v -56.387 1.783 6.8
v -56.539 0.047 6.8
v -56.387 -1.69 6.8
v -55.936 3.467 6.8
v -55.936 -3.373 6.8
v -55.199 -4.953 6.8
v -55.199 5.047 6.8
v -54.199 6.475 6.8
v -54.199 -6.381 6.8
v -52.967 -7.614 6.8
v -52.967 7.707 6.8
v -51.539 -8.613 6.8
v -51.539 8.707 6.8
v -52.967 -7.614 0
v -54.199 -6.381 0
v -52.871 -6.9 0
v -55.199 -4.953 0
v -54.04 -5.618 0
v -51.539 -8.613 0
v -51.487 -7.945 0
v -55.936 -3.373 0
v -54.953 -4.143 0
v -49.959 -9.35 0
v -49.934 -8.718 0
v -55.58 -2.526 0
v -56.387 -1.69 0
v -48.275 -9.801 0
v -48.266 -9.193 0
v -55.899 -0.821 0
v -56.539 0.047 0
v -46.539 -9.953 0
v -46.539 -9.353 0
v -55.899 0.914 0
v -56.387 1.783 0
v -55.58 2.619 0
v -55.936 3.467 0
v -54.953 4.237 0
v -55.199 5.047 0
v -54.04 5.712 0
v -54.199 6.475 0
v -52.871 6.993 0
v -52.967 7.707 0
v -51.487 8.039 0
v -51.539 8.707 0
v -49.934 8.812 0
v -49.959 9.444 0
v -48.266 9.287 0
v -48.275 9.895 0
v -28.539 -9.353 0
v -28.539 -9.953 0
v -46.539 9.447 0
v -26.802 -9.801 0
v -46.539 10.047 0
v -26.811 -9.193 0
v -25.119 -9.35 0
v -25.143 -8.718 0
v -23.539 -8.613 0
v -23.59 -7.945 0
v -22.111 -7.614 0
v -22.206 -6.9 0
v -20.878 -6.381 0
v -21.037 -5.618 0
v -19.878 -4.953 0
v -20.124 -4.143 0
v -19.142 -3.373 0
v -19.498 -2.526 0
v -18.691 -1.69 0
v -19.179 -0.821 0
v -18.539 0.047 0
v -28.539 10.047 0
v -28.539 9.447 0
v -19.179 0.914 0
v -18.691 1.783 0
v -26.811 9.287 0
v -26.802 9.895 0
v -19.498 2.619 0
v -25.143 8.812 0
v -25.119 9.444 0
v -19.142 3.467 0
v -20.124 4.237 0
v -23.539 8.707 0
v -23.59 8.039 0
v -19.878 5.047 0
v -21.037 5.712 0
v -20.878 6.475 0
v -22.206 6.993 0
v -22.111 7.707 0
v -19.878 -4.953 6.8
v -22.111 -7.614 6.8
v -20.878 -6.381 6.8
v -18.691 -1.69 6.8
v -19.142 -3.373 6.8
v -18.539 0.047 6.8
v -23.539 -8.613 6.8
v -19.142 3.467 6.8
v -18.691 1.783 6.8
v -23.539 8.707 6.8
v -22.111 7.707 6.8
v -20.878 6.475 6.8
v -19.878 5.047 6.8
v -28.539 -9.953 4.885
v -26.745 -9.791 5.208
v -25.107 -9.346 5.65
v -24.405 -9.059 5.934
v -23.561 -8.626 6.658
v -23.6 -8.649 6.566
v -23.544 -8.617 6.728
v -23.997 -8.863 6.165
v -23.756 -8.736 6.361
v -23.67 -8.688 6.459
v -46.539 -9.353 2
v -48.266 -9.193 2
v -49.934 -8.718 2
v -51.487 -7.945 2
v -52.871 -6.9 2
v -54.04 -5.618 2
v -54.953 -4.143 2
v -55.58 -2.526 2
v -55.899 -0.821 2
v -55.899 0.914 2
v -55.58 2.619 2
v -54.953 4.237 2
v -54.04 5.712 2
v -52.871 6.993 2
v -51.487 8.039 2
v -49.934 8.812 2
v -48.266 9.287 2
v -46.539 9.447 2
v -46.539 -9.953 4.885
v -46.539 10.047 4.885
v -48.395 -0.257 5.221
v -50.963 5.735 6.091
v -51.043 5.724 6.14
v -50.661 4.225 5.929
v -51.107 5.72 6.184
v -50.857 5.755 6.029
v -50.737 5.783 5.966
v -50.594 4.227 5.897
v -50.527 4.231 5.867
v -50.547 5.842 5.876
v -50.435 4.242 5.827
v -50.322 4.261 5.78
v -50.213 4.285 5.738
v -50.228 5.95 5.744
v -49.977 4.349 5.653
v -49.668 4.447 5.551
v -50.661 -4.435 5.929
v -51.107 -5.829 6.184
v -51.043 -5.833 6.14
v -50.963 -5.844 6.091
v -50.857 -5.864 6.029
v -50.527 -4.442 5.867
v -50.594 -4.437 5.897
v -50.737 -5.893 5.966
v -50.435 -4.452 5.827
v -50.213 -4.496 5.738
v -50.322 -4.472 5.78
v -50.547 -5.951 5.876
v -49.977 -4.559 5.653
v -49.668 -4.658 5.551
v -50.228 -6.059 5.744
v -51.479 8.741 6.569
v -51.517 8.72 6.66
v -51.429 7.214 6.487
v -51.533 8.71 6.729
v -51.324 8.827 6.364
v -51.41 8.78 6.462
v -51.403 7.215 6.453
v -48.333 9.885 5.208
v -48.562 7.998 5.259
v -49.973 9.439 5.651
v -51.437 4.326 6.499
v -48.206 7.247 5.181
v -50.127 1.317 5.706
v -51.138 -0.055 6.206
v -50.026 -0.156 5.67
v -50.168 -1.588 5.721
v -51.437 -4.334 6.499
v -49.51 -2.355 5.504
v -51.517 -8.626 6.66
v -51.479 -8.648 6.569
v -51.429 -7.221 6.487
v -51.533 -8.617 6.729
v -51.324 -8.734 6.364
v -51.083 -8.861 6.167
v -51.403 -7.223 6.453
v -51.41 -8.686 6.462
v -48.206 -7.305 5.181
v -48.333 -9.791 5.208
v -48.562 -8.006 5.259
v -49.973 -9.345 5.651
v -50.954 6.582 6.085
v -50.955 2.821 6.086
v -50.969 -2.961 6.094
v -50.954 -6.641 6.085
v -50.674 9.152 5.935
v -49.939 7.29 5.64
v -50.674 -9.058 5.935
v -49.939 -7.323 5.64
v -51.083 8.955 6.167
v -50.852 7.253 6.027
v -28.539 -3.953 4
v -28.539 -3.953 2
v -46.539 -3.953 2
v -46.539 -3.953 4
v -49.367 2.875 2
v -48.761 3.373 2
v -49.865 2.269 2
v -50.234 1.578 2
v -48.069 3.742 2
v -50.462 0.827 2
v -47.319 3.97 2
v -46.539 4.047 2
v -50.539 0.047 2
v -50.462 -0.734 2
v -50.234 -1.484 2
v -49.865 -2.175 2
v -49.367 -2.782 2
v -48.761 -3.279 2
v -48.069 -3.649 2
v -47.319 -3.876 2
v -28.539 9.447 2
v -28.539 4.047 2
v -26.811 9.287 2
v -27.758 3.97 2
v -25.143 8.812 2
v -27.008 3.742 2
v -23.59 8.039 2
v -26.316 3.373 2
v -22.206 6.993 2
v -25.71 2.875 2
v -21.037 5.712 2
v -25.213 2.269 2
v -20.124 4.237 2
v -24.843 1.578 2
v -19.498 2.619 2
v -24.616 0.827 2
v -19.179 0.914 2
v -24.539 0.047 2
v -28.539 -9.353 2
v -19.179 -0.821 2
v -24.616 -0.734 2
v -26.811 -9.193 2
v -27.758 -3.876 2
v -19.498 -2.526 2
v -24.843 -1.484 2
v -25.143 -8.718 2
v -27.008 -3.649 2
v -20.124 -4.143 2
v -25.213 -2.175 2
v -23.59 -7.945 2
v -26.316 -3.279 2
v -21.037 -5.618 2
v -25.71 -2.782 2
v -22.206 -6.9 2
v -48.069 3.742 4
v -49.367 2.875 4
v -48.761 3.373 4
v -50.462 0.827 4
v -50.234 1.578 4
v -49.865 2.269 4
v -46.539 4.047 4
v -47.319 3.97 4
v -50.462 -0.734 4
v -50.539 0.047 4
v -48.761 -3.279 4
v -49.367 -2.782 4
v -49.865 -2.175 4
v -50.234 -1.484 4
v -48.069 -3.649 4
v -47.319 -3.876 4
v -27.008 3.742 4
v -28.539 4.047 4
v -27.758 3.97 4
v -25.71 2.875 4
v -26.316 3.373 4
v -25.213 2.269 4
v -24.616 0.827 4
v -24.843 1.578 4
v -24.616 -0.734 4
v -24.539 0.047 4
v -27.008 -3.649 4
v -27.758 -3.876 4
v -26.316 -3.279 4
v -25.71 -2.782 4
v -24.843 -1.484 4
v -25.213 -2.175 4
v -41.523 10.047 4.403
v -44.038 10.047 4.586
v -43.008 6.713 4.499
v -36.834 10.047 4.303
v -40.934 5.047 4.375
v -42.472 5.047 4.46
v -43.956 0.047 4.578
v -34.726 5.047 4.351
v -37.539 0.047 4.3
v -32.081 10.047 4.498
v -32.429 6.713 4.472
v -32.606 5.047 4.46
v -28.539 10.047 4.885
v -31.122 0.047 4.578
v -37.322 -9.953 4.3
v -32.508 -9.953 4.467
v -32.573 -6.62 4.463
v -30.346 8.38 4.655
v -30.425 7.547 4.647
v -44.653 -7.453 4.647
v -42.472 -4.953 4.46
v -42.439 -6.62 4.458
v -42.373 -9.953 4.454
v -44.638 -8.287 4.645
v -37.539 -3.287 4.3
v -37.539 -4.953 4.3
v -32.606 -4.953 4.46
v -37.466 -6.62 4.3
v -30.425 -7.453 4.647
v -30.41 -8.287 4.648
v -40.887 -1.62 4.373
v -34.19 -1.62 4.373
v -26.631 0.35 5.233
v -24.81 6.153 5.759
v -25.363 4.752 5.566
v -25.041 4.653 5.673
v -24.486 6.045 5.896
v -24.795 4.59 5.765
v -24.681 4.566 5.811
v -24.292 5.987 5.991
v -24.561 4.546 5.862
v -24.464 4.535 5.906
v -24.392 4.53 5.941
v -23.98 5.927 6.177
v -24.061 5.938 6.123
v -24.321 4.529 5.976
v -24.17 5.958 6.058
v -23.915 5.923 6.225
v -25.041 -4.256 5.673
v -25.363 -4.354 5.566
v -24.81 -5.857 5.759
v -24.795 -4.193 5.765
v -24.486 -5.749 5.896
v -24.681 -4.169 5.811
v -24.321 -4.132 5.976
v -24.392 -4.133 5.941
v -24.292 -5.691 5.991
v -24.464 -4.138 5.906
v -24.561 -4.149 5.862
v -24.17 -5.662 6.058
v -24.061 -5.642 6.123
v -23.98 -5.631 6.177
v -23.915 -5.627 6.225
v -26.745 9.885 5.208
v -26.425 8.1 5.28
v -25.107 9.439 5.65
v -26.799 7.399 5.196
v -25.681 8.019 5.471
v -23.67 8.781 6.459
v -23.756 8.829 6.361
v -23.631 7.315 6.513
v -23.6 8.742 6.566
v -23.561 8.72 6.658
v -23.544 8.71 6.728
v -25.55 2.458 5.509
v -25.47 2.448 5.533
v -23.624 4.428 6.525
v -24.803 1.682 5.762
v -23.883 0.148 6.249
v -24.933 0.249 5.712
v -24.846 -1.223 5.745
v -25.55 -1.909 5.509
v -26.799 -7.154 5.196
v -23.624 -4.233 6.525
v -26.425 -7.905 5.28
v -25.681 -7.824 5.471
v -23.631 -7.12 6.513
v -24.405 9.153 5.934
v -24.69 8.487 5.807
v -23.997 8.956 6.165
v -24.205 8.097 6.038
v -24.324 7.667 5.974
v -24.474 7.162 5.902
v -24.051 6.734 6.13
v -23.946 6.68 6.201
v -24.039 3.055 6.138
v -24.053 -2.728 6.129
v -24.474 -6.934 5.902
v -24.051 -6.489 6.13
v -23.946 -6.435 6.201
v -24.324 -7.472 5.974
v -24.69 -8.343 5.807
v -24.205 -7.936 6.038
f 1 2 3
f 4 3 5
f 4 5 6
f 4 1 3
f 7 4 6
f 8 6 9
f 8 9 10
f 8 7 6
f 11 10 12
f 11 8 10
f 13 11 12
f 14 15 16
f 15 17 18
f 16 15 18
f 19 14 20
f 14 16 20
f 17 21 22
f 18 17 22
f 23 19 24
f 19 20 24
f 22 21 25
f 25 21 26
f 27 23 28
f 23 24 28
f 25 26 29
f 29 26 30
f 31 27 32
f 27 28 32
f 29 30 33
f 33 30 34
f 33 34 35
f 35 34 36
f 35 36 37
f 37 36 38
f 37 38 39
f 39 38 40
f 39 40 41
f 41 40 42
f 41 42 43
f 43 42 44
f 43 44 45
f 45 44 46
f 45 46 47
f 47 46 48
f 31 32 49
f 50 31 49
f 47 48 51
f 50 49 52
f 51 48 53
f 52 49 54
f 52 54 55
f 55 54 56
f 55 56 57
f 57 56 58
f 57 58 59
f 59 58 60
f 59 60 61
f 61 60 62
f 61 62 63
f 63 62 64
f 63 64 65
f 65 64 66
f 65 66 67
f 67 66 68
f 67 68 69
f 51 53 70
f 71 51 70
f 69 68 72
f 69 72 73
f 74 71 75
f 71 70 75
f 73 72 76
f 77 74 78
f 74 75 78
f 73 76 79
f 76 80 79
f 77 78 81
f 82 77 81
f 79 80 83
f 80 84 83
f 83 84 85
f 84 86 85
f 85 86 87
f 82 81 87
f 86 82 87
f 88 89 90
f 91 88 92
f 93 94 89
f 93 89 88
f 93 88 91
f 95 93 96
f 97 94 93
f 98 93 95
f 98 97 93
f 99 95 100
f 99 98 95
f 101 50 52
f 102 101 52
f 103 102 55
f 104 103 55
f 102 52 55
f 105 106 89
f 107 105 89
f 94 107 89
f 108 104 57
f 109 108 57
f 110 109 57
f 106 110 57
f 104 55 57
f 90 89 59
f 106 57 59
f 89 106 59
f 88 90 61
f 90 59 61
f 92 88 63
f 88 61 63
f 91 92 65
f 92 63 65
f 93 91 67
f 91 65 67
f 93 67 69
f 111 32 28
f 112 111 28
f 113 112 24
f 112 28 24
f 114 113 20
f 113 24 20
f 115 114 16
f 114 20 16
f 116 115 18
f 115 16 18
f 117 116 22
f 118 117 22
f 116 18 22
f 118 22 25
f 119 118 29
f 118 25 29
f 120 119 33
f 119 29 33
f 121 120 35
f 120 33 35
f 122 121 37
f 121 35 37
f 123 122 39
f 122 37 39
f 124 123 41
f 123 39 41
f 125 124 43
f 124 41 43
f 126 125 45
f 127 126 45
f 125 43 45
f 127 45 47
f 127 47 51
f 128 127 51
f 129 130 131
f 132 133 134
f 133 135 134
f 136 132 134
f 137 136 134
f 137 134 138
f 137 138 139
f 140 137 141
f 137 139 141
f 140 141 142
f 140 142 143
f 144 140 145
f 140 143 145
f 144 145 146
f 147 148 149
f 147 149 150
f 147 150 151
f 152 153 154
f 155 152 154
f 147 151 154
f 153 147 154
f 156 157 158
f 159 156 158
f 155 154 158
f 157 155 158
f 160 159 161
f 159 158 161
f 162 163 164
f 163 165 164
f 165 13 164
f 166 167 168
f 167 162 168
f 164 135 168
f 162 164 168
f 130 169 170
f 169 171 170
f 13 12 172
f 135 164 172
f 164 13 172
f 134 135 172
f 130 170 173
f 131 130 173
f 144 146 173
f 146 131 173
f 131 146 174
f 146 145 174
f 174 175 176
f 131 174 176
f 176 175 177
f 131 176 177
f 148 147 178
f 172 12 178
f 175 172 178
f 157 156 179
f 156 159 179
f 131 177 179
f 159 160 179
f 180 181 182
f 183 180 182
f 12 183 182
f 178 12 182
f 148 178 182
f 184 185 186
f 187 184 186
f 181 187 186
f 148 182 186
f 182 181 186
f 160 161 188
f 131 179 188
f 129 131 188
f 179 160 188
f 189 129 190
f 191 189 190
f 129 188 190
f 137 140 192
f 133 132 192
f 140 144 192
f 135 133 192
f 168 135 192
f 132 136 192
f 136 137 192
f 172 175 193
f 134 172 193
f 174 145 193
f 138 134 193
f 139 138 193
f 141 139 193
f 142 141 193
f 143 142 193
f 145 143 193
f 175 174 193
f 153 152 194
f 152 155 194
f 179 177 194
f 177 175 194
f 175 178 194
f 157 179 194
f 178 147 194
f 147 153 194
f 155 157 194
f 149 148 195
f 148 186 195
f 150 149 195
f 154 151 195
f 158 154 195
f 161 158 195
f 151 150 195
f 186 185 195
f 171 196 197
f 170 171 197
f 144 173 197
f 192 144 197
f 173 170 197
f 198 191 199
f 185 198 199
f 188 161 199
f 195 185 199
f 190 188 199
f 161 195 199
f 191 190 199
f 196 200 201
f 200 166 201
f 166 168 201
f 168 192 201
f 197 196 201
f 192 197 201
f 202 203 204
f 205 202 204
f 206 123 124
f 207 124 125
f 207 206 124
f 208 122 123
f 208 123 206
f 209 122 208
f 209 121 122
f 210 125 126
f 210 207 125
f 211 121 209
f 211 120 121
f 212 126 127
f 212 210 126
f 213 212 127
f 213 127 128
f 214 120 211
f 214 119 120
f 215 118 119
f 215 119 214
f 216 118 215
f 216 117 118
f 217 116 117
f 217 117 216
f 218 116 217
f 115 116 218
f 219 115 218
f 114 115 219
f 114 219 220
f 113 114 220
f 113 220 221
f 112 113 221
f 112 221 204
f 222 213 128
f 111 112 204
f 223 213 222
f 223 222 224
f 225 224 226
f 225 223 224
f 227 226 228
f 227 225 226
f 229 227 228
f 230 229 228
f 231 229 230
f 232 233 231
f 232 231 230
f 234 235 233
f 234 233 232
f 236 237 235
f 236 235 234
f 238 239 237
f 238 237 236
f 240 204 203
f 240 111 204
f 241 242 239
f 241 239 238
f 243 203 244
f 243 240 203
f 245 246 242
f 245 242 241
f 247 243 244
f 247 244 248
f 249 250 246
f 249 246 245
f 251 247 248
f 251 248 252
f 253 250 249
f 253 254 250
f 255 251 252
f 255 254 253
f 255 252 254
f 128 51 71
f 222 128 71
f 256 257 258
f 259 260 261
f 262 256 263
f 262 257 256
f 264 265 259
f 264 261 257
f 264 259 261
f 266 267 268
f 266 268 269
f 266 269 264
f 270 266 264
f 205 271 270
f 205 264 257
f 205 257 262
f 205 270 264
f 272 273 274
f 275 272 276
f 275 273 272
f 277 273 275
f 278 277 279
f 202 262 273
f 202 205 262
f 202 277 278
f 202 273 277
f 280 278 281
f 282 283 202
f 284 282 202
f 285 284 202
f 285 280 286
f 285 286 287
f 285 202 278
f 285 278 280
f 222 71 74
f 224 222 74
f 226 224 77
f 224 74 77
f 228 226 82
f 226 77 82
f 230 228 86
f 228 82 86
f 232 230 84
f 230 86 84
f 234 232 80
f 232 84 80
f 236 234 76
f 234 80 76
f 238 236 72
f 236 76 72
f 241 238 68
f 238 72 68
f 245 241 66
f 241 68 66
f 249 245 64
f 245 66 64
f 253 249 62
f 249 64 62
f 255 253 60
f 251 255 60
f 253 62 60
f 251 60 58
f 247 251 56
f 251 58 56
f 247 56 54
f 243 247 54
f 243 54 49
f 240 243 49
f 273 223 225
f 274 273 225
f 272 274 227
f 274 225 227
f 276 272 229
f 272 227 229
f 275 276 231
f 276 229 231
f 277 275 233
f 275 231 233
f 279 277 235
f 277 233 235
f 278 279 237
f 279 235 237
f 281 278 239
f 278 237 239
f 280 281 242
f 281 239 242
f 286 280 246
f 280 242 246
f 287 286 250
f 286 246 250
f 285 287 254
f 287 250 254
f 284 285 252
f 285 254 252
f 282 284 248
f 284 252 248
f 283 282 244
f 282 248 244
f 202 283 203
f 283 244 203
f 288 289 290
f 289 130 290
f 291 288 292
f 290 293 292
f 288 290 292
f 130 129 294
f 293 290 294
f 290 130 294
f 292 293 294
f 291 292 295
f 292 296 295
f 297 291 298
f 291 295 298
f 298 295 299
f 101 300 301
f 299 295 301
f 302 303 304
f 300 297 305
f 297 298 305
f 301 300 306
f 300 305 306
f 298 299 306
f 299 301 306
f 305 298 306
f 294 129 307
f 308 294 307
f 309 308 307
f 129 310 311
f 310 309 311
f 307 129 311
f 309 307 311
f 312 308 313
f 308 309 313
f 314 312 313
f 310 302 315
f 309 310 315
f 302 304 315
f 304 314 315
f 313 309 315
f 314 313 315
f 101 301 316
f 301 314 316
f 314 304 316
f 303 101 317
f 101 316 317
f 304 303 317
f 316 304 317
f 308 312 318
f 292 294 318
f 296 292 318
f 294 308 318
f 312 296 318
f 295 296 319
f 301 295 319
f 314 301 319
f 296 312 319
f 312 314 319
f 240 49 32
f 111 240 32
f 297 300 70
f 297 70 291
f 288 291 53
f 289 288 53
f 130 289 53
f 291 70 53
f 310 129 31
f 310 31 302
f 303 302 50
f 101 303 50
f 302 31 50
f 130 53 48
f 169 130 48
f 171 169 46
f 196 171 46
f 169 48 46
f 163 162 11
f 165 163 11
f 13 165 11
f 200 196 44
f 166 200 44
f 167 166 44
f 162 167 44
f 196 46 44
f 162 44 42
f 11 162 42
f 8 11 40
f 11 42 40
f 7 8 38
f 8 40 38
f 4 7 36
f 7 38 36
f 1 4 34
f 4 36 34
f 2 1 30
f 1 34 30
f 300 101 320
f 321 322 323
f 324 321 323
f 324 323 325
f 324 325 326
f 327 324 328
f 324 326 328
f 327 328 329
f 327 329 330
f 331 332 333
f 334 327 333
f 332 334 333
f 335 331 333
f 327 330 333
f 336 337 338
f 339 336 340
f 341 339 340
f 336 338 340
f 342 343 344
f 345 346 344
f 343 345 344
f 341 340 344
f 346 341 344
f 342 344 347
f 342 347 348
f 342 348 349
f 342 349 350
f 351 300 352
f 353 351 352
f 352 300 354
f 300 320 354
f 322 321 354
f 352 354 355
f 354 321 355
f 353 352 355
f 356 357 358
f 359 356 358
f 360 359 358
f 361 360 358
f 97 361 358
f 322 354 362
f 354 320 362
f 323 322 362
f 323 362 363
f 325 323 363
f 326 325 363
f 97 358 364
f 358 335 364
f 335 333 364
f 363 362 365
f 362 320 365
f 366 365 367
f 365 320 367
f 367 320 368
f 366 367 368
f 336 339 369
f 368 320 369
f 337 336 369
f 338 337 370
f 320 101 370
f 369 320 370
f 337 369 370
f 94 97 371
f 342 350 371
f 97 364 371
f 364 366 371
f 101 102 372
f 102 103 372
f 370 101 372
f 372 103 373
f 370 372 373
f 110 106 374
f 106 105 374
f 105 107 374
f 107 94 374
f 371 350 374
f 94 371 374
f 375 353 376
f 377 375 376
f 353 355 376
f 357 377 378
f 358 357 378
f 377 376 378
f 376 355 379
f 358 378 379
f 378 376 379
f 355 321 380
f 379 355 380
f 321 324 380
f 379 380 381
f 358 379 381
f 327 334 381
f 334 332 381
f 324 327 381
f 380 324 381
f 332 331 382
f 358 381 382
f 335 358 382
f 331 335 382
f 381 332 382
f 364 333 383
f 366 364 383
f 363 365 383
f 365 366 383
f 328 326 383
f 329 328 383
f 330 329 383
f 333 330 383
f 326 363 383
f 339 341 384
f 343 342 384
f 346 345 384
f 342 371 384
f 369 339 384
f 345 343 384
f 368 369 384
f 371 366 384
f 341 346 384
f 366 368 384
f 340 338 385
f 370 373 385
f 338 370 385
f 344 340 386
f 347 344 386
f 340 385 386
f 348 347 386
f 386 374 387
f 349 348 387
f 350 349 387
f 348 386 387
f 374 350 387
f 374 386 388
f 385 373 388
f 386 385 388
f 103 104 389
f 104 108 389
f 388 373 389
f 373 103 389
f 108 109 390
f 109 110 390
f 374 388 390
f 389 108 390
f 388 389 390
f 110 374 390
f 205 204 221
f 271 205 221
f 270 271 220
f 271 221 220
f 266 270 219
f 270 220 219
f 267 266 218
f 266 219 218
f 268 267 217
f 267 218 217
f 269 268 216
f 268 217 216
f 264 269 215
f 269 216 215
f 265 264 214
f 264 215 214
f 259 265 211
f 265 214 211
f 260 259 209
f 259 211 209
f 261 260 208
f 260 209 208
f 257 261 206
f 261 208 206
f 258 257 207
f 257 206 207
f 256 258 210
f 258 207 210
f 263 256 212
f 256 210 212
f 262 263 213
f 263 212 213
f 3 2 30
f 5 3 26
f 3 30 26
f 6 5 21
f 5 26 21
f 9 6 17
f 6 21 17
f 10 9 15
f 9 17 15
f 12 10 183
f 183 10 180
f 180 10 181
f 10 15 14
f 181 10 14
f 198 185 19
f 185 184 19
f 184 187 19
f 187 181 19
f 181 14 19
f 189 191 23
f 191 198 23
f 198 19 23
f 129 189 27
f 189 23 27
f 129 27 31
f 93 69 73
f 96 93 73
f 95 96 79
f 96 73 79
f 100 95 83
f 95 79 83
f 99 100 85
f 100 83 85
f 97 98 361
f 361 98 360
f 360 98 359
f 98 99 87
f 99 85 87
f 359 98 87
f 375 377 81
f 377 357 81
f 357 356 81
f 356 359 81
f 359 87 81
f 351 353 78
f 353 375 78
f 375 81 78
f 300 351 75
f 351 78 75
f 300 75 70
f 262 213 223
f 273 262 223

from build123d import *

# Parameters (mm, degrees)
F1_DEPTH = 6.8
F3_DEPTH = 25
F5_DEPTH = 2
F7_DEPTH = 2


with BuildPart() as f1:
    # F0 (on Top) → F1 (new body)
    with BuildSketch(Plane.XY):
        with BuildLine():
            ThreePointArc((-46.538709, 10.046789), (-53.609776, 7.117857), (-56.538709, 0.046789))
            Line((-56.538709, 0.046789), (-37.538709, 0.046789))
            Line((-37.538709, 0.046789), (-37.538709, 10.046789))
            Line((-37.538709, 10.046789), (-46.538709, 10.046789))
        make_face()
        with BuildLine():
            Line((-37.538709, 0.046789), (-56.538709, 0.046789))
            ThreePointArc((-56.538709, 0.046789), (-53.609776, -7.024279), (-46.538709, -9.953211))
            Line((-46.538709, -9.953211), (-37.538709, -9.953211))
            Line((-37.538709, -9.953211), (-37.538709, 0.046789))
        make_face()
        with BuildLine():
            Line((-37.538709, 10.046789), (-37.538709, 0.046789))
            Line((-37.538709, 0.046789), (-18.538709, 0.046789))
            ThreePointArc((-18.538709, 0.046789), (-21.467641, 7.117857), (-28.538709, 10.046789))
            Line((-28.538709, 10.046789), (-37.538709, 10.046789))
        make_face()
        with BuildLine():
            Line((-18.538709, 0.046789), (-37.538709, 0.046789))
            Line((-37.538709, 0.046789), (-37.538709, -9.953211))
            Line((-37.538709, -9.953211), (-28.538709, -9.953211))
            ThreePointArc((-28.538709, -9.953211), (-21.467641, -7.024279), (-18.538709, 0.046789))
        make_face()
    extrude(amount=F1_DEPTH)

    # F2 (on face) → F3 (cut)
    with BuildSketch(Plane.XZ.offset(9.953211)):
        with BuildLine():
            Line((-46.538709, 6.8), (-46.538709, 4.885035))
            add(Edge.make_bspline(
                [(-46.538709, 4.885035), (-37.538709, 3.536233), (-28.538709, 4.885035)],
                knots=[4.014167, 4.014167, 4.014167, 5.410611, 5.410611, 5.410611], degree=2, weights=[1, 0.765986, 1]))
            Line((-28.538709, 4.885035), (-28.538709, 6.8))
            Line((-28.538709, 6.8), (-46.538709, 6.8))
        make_face()
        with BuildLine():
            add(Edge.make_bspline(
                [(-28.538709, 4.885035), (-23.538709, 5.634369), (-23.538709, 6.8)],
                knots=[5.410611, 5.410611, 5.410611, 6.283185, 6.283185, 6.283185], degree=2, weights=[1, 0.906327, 1]))
            add(Edge.make_bspline(
                [(-23.538709, 6.8), (-23.538709, 10.724017), (-43.454788, 9.065817), (-63.370868, 7.407617), (-46.538709, 4.885035)],
                knots=[0, 0, 0, 2.007083, 2.007083, 4.014167, 4.014167, 4.014167], degree=2, weights=[1, 0.537319, 1, 0.537319, 1]))
            Line((-46.538709, 4.885035), (-46.538709, 6.8))
            Line((-46.538709, 6.8), (-28.538709, 6.8))
            Line((-28.538709, 6.8), (-28.538709, 4.885035))
        make_face()
    extrude(amount=-F3_DEPTH, mode=Mode.SUBTRACT)

    # F4 (on face) → F5 (cut)
    with BuildSketch(Plane(origin=(0, 0, 0), x_dir=(1, 0, 0), z_dir=(0, 0, -1))):
        with BuildLine():
            Line((-28.538709, 9.353211), (-46.538709, 9.353211))
            ThreePointArc((-46.538709, 9.353211), (-55.938709, -0.046789), (-46.538709, -9.446789))
            Line((-46.538709, -9.446789), (-28.538709, -9.446789))
            ThreePointArc((-28.538709, -9.446789), (-19.138709, -0.046789), (-28.538709, 9.353211))
        make_face()
    extrude(amount=-F5_DEPTH, mode=Mode.SUBTRACT)

    # F6 (on face) → F7 (cut)
    with BuildSketch(Plane(origin=(0, 0, 2), x_dir=(1, 0, 0), z_dir=(0, 0, -1))):
        with BuildLine():
            Line((-28.538709, 3.953211), (-46.538709, 3.953211))
            ThreePointArc((-46.538709, 3.953211), (-50.538709, -0.046789), (-46.538709, -4.046789))
            Line((-46.538709, -4.046789), (-28.538709, -4.046789))
            ThreePointArc((-28.538709, -4.046789), (-24.538709, -0.046789), (-28.538709, 3.953211))
        make_face()
    extrude(amount=-F7_DEPTH, mode=Mode.SUBTRACT)


solid = f1.part
